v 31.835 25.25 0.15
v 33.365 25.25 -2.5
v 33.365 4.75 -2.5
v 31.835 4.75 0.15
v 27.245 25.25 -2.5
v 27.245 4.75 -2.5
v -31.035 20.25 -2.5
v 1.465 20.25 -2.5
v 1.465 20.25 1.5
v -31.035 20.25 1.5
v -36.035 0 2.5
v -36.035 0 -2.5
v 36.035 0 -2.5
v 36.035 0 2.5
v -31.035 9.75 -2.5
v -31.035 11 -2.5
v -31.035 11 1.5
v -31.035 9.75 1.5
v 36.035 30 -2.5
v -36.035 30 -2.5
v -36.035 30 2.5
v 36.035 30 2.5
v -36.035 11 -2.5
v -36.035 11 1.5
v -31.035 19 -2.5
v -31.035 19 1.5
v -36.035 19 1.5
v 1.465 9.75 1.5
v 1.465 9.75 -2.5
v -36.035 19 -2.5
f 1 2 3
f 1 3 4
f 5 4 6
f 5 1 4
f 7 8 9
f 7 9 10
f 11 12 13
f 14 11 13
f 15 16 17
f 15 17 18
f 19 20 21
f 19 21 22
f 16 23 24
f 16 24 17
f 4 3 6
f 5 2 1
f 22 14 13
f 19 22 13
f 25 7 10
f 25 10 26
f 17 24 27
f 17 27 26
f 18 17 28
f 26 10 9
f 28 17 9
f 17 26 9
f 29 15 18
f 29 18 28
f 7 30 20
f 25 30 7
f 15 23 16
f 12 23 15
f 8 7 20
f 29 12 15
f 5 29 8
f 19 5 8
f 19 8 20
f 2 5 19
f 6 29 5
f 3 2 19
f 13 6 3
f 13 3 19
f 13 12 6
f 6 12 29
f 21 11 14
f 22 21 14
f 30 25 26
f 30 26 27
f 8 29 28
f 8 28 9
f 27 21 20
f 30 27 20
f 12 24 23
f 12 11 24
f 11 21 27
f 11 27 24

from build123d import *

# Parameters (mm, degrees)
SKETCH_1_W          = 72.07
SKETCH_1_H          = 5
EXTRUDE_1_DEPTH     = 30
CUT_EXTRUDE_1_DEPTH = 4
CUT_EXTRUDE_START   = -15
CUT_EXTRUDE_2_DEPTH = 10.25


with BuildPart() as part:
    # 草圖1 → 填料-伸長1 (new body)
    with BuildSketch(Plane(origin=(0, 0, 0), x_dir=(1, 0, 0), z_dir=(0, 1, 0))):
        Rectangle(SKETCH_1_W, SKETCH_1_H)
    extrude(amount=EXTRUDE_1_DEPTH)

    # 草圖2 → 除料-伸長1 (cut)
    with BuildSketch(Plane(origin=(0, 0, -2.5), x_dir=(-1, 0, 0), z_dir=(0, 0, -1))):
        Polygon((36.035, 19), (36.035, 11), (31.035, 11), (31.035, 9.75), (-1.465, 9.75), (-1.465, 20.25), (31.035, 20.25), (31.035, 19), align=None)
    extrude(amount=-CUT_EXTRUDE_1_DEPTH, mode=Mode.SUBTRACT)

    # 草圖3 → 除料-伸長2 (cut, symmetric)
    with BuildSketch(Plane(origin=(0, 30, 0), x_dir=(1, 0, 0), z_dir=(0, 1, 0)).offset(CUT_EXTRUDE_START)):
        Polygon((33.364978213, 2.5), (31.835, -0.15), (27.24506536, 2.5), align=None)
    extrude(amount=CUT_EXTRUDE_2_DEPTH, both=True, mode=Mode.SUBTRACT)


solid = part.part
